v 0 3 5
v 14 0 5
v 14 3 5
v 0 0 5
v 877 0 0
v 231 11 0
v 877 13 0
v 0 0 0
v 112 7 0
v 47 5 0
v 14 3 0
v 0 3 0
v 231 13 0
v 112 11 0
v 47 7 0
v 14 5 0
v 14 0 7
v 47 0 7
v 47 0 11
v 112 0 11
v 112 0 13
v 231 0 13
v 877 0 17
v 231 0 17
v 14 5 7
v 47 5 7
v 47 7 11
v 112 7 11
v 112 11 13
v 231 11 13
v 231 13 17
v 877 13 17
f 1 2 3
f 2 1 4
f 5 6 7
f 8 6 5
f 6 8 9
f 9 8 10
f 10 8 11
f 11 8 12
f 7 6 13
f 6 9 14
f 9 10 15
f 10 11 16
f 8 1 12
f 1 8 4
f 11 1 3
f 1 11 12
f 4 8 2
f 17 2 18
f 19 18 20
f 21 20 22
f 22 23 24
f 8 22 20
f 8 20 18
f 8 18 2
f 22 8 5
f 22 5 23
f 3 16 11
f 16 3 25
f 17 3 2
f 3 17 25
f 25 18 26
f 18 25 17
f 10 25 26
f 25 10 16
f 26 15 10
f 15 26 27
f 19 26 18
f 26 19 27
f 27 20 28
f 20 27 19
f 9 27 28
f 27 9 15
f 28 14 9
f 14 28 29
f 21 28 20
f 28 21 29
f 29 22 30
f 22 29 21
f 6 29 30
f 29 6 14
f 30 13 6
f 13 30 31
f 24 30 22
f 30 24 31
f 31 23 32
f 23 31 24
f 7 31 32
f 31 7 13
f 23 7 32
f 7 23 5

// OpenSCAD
translate([1.0, 1.5, 2.5]) color([0.30776249733867533, 0.3765889324074634, 0.14692685712634312]) cube([2, 3, 5], center=true);
translate([3.0, 1.5, 2.5]) color([0.1252359956830017, 0.2228174233130471, 0.5083324480268261]) cube([2, 3, 5], center=true);
translate([5.0, 1.5, 2.5]) color([0.23665719296677712, 0.18394442119493715, 0.3724619255943996]) cube([2, 3, 5], center=true);
translate([7.0, 1.5, 2.5]) color([0.6631955135334705, 0.8609746033864751, 0.6012082175951422]) cube([2, 3, 5], center=true);
translate([9.0, 1.5, 2.5]) color([0.3938011681878649, 0.7021695231885549, 0.13202027544551864]) cube([2, 3, 5], center=true);
translate([11.0, 1.5, 2.5]) color([0.29938666187805807, 0.4167493264442593, 0.9263964007964989]) cube([2, 3, 5], center=true);
translate([13.0, 1.5, 2.5]) color([0.5910765187605377, 0.2980281087530109, 0.35456411603507165]) cube([2, 3, 5], center=true);
translate([15.5, 2.5, 3.5]) color([0.24805850121983253, 0.6327789974902275, 0.6370445113549524]) cube([3, 5, 7], center=true);
translate([18.5, 2.5, 3.5]) color([0.5292072971005523, 0.376431751315491, 0.008427608141492793]) cube([3, 5, 7], center=true);
translate([21.5, 2.5, 3.5]) color([0.9619565585865117, 0.901262330417864, 0.44129738363616366]) cube([3, 5, 7], center=true);
translate([24.5, 2.5, 3.5]) color([0.3715965769686672, 0.9523409342086877, 0.09105648808381206]) cube([3, 5, 7], center=true);
translate([27.5, 2.5, 3.5]) color([0.18545820412424963, 0.10861526636012075, 0.11215874223546374]) cube([3, 5, 7], center=true);
translate([30.5, 2.5, 3.5]) color([0.6055458611860893, 0.15387883630139487, 0.7025980908137885]) cube([3, 5, 7], center=true);
translate([33.5, 2.5, 3.5]) color([0.928268212070889, 0.18538068806857422, 0.42170431041506296]) cube([3, 5, 7], center=true);
translate([36.5, 2.5, 3.5]) color([0.1747372019883816, 0.9595322940755414, 0.3403879026852894]) cube([3, 5, 7], center=true);
translate([39.5, 2.5, 3.5]) color([0.5233486454380116, 0.35536744790103547, 0.6315169232882821]) cube([3, 5, 7], center=true);
translate([42.5, 2.5, 3.5]) color([0.08649939658707362, 0.7550350740823142, 0.2947283238309857]) cube([3, 5, 7], center=true);
translate([45.5, 2.5, 3.5]) color([0.8301737658604361, 0.4490883769000732, 0.4620108455998946]) cube([3, 5, 7], center=true);
translate([49.5, 3.5, 5.5]) color([0.2187341846418389, 0.11445722556586746, 0.9788025142917065]) cube([5, 7, 11], center=true);
translate([54.5, 3.5, 5.5]) color([0.3011589686960586, 0.6091605287508749, 0.4242090709976407]) cube([5, 7, 11], center=true);
translate([59.5, 3.5, 5.5]) color([0.7513524999576429, 0.09255304692818778, 0.4976795968420046]) cube([5, 7, 11], center=true);
translate([64.5, 3.5, 5.5]) color([0.9609180855182016, 0.5437408220916614, 0.405305104554358]) cube([5, 7, 11], center=true);
translate([69.5, 3.5, 5.5]) color([0.6320656015278037, 0.0216193804206819, 0.2700784048715086]) cube([5, 7, 11], center=true);
translate([74.5, 3.5, 5.5]) color([0.6684886667173141, 0.0002532098932251925, 0.3984286079265319]) cube([5, 7, 11], center=true);
translate([79.5, 3.5, 5.5]) color([0.8905618085087551, 0.7099647178965433, 0.4445845492335537]) cube([5, 7, 11], center=true);
translate([84.5, 3.5, 5.5]) color([0.7465509493098265, 0.35382203223851694, 0.8712980207444939]) cube([5, 7, 11], center=true);
translate([89.5, 3.5, 5.5]) color([0.6725473918674463, 0.19603088941730495, 0.08525923665948931]) cube([5, 7, 11], center=true);
translate([94.5, 3.5, 5.5]) color([0.0704556688087915, 0.26248678792717994, 0.533638651221174]) cube([5, 7, 11], center=true);
translate([99.5, 3.5, 5.5]) color([0.11818482376773232, 0.8594532404023933, 0.8906989166138923]) cube([5, 7, 11], center=true);
translate([104.5, 3.5, 5.5]) color([0.7620005545284954, 0.06809296768032302, 0.8609410769469436]) cube([5, 7, 11], center=true);
translate([109.5, 3.5, 5.5]) color([0.2827478909480132, 0.13442052583382869, 0.5230599837537087]) cube([5, 7, 11], center=true);
translate([115.5, 5.5, 6.5]) color([0.21027834364306774, 0.10530639745894443, 0.9556548717215211]) cube([7, 11, 13], center=true);
translate([122.5, 5.5, 6.5]) color([0.5435731515542631, 0.7414270622920264, 0.9040457292510377]) cube([7, 11, 13], center=true);
translate([129.5, 5.5, 6.5]) color([0.2786145977098805, 0.4423646135017597, 0.5682329433322765]) cube([7, 11, 13], center=true);
translate([136.5, 5.5, 6.5]) color([0.13781274972163116, 0.1232982180791492, 0.12051785276403837]) cube([7, 11, 13], center=true);
translate([143.5, 5.5, 6.5]) color([0.4012165411640888, 0.4679428423906348, 0.5596131508667647]) cube([7, 11, 13], center=true);
translate([150.5, 5.5, 6.5]) color([0.29896126951320356, 0.6321114709426877, 0.7423454703026071]) cube([7, 11, 13], center=true);
translate([157.5, 5.5, 6.5]) color([0.21800995973285464, 0.48885816108208613, 0.501567157493831]) cube([7, 11, 13], center=true);
translate([164.5, 5.5, 6.5]) color([0.49271975198428686, 0.958422556968198, 0.44398175403613704]) cube([7, 11, 13], center=true);
translate([171.5, 5.5, 6.5]) color([0.14281143058247625, 0.4955231327742775, 0.8873352305676206]) cube([7, 11, 13], center=true);
translate([178.5, 5.5, 6.5]) color([0.21571394075115613, 0.3554013630116646, 0.39096604949642]) cube([7, 11, 13], center=true);
translate([185.5, 5.5, 6.5]) color([0.9928835035123682, 0.8462248334797323, 0.9789066021625461]) cube([7, 11, 13], center=true);
translate([192.5, 5.5, 6.5]) color([0.6868956228130294, 0.08137290691060206, 0.9493092651810784]) cube([7, 11, 13], center=true);
translate([199.5, 5.5, 6.5]) color([0.9246190463677613, 0.3951154575230438, 0.3612783181755085]) cube([7, 11, 13], center=true);
translate([206.5, 5.5, 6.5]) color([0.11615210489091876, 0.0037403702712440756, 0.2703277384724262]) cube([7, 11, 13], center=true);
translate([213.5, 5.5, 6.5]) color([0.6403732426441148, 0.29252642189785794, 0.9007258804640697]) cube([7, 11, 13], center=true);
translate([220.5, 5.5, 6.5]) color([0.14067978971908934, 0.5728503338092871, 0.1912043400515635]) cube([7, 11, 13], center=true);
translate([227.5, 5.5, 6.5]) color([0.43401891336511733, 0.7163457448050065, 0.3841301513333275]) cube([7, 11, 13], center=true);
translate([236.5, 6.5, 8.5]) color([0.33069552050314754, 0.6480049557775331, 0.6874717059379091]) cube([11, 13, 17], center=true);
translate([247.5, 6.5, 8.5]) color([0.14801928734251768, 0.93323205939552, 0.14750072005511716]) cube([11, 13, 17], center=true);
translate([258.5, 6.5, 8.5]) color([0.31607169754224296, 0.2088660889148145, 0.1868244368145192]) cube([11, 13, 17], center=true);
translate([269.5, 6.5, 8.5]) color([0.3491672112743387, 0.9834841816788549, 0.427290207198605]) cube([11, 13, 17], center=true);
translate([280.5, 6.5, 8.5]) color([0.49195852420878716, 0.7297831417632067, 0.7955834433152874]) cube([11, 13, 17], center=true);
translate([291.5, 6.5, 8.5]) color([0.43927203819181504, 0.2042687131951023, 0.709997013582239]) cube([11, 13, 17], center=true);
translate([302.5, 6.5, 8.5]) color([0.9058221085991531, 0.03327924187503195, 0.6331757983912308]) cube([11, 13, 17], center=true);
translate([313.5, 6.5, 8.5]) color([0.8710093735661795, 0.3636101637556439, 0.7431628081058981]) cube([11, 13, 17], center=true);
translate([324.5, 6.5, 8.5]) color([0.6774926049513658, 0.23306417175218364, 0.2975271762349214]) cube([11, 13, 17], center=true);
translate([335.5, 6.5, 8.5]) color([0.0866296567389645, 0.8688435220131177, 0.7514921149941085]) cube([11, 13, 17], center=true);
translate([346.5, 6.5, 8.5]) color([0.7714305883456576, 0.8829516943772963, 0.4114323292545551]) cube([11, 13, 17], center=true);
translate([357.5, 6.5, 8.5]) color([0.05394001775890156, 0.696805048854085, 0.6656296547984208]) cube([11, 13, 17], center=true);
translate([368.5, 6.5, 8.5]) color([0.6485122289860075, 0.5471816206705559, 0.7344166333532061]) cube([11, 13, 17], center=true);
translate([379.5, 6.5, 8.5]) color([0.4306045068871984, 0.45460236437769275, 0.25475221651879554]) cube([11, 13, 17], center=true);
translate([390.5, 6.5, 8.5]) color([0.47565246533915095, 0.3371942584654095, 0.04223511400675217]) cube([11, 13, 17], center=true);
translate([401.5, 6.5, 8.5]) color([0.05255331220371673, 0.34980223330761895, 0.2898096938030986]) cube([11, 13, 17], center=true);
translate([412.5, 6.5, 8.5]) color([0.007130057665757694, 0.06369015415518986, 0.42774457246440645]) cube([11, 13, 17], center=true);
translate([423.5, 6.5, 8.5]) color([0.22216650821772055, 0.6086379170158094, 0.557768500755667]) cube([11, 13, 17], center=true);
translate([434.5, 6.5, 8.5]) color([0.22097295115667703, 0.19284823789822858, 0.6083188139076446]) cube([11, 13, 17], center=true);
translate([449.5, 6.5, 8.5]) color([0.606354511401297, 0.08562053587131313, 0.31903016062772993]) cube([19, 13, 17], center=true);
translate([468.5, 6.5, 8.5]) color([0.53590115499306, 0.8934753784920533, 0.25549985489866966]) cube([19, 13, 17], center=true);
translate([487.5, 6.5, 8.5]) color([0.5219903070058861, 0.1901317713313112, 0.08011594570868696]) cube([19, 13, 17], center=true);
translate([506.5, 6.5, 8.5]) color([0.8699478397109702, 0.3457472114844995, 0.837290862214726]) cube([19, 13, 17], center=true);
translate([525.5, 6.5, 8.5]) color([0.25127706432840136, 0.7290260027021367, 0.3013213449137814]) cube([19, 13, 17], center=true);
translate([544.5, 6.5, 8.5]) color([0.5169005458056509, 0.38467176448284957, 0.4820846642847386]) cube([19, 13, 17], center=true);
translate([563.5, 6.5, 8.5]) color([0.8719757028853922, 0.2399620044566907, 0.3058147052987177]) cube([19, 13, 17], center=true);
translate([582.5, 6.5, 8.5]) color([0.5519737755681405, 0.009208459116004764, 0.4953005367860557]) cube([19, 13, 17], center=true);
translate([601.5, 6.5, 8.5]) color([0.43819859659275806, 0.9171481192782721, 0.41212019308576986]) cube([19, 13, 17], center=true);
translate([620.5, 6.5, 8.5]) color([0.49358197644734136, 0.44010860560926524, 0.0856157398333921]) cube([19, 13, 17], center=true);
translate([639.5, 6.5, 8.5]) color([0.2411443971002879, 0.8262650576639278, 0.15379567752788093]) cube([19, 13, 17], center=true);
translate([658.5, 6.5, 8.5]) color([0.8842528530898255, 0.2134665283608419, 0.6127566924478359]) cube([19, 13, 17], center=true);
translate([677.5, 6.5, 8.5]) color([0.818008657000479, 0.5590112191053322, 0.8866043301622452]) cube([19, 13, 17], center=true);
translate([696.5, 6.5, 8.5]) color([0.39447102725022787, 0.9589163376419946, 0.24972819156954773]) cube([19, 13, 17], center=true);
translate([715.5, 6.5, 8.5]) color([0.22005049979750413, 0.8404590105346786, 0.2789960200671917]) cube([19, 13, 17], center=true);
translate([734.5, 6.5, 8.5]) color([0.35210354864297055, 0.9946691500756418, 0.10728537706325991]) cube([19, 13, 17], center=true);
translate([753.5, 6.5, 8.5]) color([0.8996256313138141, 0.6100819970747507, 0.7890377134172993]) cube([19, 13, 17], center=true);
translate([772.5, 6.5, 8.5]) color([0.7110679469752405, 0.7774643558396669, 0.5140354678382717]) cube([19, 13, 17], center=true);
translate([791.5, 6.5, 8.5]) color([0.46207744282607, 0.6343562920465169, 0.27254621857246664]) cube([19, 13, 17], center=true);
translate([810.5, 6.5, 8.5]) color([0.016558424522952975, 0.6148716567717017, 0.7119066573597548]) cube([19, 13, 17], center=true);
translate([829.5, 6.5, 8.5]) color([0.17257617960039529, 0.41465974039415787, 0.21806470516739018]) cube([19, 13, 17], center=true);
translate([848.5, 6.5, 8.5]) color([0.8797884787327306, 0.9971497033508181, 0.006439244314443648]) cube([19, 13, 17], center=true);
translate([867.5, 6.5, 8.5]) color([0.5355241113549698, 0.428269623660265, 0.0497703561320445]) cube([19, 13, 17], center=true);
